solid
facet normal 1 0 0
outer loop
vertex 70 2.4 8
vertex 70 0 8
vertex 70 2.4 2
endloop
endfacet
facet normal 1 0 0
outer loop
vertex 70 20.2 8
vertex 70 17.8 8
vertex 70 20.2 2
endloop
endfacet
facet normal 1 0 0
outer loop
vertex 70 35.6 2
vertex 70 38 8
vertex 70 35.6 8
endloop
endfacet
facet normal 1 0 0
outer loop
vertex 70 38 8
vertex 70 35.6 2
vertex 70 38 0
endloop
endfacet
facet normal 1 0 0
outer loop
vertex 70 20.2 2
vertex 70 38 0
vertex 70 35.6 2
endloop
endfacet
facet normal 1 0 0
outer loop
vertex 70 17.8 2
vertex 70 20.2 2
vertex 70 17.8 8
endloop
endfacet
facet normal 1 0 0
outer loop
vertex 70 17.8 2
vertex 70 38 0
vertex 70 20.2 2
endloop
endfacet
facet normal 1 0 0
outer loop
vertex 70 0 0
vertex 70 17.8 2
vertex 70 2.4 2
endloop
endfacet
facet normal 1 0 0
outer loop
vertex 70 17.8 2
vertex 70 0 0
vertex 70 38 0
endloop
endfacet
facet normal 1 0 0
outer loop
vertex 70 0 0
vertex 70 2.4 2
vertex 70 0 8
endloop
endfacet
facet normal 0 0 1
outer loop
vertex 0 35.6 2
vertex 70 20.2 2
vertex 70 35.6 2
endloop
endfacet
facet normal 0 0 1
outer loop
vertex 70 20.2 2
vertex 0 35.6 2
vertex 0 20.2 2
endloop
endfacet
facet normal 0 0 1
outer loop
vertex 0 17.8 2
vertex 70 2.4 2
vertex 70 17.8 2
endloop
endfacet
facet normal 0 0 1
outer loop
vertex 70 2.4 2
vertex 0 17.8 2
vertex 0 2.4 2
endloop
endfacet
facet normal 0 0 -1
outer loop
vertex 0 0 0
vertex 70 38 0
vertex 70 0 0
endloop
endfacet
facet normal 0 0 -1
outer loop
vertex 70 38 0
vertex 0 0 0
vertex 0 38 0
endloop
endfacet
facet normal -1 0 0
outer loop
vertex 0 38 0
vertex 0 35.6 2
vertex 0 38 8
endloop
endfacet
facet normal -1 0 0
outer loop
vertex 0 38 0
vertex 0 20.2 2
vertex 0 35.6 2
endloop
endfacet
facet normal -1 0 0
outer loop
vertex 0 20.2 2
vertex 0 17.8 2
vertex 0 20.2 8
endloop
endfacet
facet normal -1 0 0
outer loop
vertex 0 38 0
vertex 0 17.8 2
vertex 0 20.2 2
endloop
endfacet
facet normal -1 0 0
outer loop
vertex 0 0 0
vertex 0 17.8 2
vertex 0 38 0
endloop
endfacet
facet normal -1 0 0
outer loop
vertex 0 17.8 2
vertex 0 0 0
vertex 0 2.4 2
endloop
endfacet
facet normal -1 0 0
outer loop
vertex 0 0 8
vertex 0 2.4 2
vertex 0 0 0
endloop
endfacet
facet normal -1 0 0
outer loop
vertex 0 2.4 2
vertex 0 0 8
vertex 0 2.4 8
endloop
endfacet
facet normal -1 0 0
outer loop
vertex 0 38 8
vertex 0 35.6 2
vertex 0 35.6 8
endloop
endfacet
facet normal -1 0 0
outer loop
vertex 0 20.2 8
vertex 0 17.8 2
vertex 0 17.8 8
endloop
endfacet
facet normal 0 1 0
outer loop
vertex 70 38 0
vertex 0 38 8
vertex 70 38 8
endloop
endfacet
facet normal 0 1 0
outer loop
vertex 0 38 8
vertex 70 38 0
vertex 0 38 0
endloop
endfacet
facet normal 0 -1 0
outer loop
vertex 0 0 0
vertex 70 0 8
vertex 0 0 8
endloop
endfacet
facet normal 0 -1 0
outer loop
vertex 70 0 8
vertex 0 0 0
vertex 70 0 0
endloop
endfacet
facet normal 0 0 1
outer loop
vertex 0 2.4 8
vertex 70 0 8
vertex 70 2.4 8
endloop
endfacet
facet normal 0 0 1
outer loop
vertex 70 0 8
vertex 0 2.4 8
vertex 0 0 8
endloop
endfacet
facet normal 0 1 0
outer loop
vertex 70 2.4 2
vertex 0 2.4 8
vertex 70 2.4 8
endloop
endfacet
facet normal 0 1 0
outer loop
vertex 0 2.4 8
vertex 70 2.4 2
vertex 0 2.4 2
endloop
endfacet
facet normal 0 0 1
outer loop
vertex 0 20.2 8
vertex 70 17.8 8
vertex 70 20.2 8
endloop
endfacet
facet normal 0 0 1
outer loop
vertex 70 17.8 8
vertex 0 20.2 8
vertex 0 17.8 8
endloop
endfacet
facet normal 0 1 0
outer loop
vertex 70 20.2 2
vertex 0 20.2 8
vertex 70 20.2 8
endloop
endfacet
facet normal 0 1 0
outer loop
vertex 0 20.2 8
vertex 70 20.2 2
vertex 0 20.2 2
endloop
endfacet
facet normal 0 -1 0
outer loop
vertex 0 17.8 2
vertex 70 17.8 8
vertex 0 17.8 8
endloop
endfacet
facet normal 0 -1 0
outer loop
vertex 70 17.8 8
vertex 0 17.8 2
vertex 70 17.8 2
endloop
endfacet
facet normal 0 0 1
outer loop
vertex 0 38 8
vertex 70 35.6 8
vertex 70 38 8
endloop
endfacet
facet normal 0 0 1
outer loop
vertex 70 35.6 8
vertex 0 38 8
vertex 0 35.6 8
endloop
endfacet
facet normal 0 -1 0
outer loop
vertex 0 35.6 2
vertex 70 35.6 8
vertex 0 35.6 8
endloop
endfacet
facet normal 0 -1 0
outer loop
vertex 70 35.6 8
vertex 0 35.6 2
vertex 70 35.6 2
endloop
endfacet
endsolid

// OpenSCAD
// SPDX-License-Identifier: CC-BY-4.0
// Original design: OpenPrintLab contributors. Units: mm.
// Generated inspection snapshot; edit models/recipes.py and catalog.json to customize.
// https://github.com/Prashanth261993/OpenPrintLab
union() {
  translate([0.000000, 0.000000, 0.000000]) cube([70.000000, 38.000000, 2.000000]);
  translate([0.000000, 0.000000, 2.000000]) cube([70.000000, 2.400000, 6.000000]);
  translate([0.000000, 17.800000, 2.000000]) cube([70.000000, 2.400000, 6.000000]);
  translate([0.000000, 35.600000, 2.000000]) cube([70.000000, 2.400000, 6.000000]);
}
